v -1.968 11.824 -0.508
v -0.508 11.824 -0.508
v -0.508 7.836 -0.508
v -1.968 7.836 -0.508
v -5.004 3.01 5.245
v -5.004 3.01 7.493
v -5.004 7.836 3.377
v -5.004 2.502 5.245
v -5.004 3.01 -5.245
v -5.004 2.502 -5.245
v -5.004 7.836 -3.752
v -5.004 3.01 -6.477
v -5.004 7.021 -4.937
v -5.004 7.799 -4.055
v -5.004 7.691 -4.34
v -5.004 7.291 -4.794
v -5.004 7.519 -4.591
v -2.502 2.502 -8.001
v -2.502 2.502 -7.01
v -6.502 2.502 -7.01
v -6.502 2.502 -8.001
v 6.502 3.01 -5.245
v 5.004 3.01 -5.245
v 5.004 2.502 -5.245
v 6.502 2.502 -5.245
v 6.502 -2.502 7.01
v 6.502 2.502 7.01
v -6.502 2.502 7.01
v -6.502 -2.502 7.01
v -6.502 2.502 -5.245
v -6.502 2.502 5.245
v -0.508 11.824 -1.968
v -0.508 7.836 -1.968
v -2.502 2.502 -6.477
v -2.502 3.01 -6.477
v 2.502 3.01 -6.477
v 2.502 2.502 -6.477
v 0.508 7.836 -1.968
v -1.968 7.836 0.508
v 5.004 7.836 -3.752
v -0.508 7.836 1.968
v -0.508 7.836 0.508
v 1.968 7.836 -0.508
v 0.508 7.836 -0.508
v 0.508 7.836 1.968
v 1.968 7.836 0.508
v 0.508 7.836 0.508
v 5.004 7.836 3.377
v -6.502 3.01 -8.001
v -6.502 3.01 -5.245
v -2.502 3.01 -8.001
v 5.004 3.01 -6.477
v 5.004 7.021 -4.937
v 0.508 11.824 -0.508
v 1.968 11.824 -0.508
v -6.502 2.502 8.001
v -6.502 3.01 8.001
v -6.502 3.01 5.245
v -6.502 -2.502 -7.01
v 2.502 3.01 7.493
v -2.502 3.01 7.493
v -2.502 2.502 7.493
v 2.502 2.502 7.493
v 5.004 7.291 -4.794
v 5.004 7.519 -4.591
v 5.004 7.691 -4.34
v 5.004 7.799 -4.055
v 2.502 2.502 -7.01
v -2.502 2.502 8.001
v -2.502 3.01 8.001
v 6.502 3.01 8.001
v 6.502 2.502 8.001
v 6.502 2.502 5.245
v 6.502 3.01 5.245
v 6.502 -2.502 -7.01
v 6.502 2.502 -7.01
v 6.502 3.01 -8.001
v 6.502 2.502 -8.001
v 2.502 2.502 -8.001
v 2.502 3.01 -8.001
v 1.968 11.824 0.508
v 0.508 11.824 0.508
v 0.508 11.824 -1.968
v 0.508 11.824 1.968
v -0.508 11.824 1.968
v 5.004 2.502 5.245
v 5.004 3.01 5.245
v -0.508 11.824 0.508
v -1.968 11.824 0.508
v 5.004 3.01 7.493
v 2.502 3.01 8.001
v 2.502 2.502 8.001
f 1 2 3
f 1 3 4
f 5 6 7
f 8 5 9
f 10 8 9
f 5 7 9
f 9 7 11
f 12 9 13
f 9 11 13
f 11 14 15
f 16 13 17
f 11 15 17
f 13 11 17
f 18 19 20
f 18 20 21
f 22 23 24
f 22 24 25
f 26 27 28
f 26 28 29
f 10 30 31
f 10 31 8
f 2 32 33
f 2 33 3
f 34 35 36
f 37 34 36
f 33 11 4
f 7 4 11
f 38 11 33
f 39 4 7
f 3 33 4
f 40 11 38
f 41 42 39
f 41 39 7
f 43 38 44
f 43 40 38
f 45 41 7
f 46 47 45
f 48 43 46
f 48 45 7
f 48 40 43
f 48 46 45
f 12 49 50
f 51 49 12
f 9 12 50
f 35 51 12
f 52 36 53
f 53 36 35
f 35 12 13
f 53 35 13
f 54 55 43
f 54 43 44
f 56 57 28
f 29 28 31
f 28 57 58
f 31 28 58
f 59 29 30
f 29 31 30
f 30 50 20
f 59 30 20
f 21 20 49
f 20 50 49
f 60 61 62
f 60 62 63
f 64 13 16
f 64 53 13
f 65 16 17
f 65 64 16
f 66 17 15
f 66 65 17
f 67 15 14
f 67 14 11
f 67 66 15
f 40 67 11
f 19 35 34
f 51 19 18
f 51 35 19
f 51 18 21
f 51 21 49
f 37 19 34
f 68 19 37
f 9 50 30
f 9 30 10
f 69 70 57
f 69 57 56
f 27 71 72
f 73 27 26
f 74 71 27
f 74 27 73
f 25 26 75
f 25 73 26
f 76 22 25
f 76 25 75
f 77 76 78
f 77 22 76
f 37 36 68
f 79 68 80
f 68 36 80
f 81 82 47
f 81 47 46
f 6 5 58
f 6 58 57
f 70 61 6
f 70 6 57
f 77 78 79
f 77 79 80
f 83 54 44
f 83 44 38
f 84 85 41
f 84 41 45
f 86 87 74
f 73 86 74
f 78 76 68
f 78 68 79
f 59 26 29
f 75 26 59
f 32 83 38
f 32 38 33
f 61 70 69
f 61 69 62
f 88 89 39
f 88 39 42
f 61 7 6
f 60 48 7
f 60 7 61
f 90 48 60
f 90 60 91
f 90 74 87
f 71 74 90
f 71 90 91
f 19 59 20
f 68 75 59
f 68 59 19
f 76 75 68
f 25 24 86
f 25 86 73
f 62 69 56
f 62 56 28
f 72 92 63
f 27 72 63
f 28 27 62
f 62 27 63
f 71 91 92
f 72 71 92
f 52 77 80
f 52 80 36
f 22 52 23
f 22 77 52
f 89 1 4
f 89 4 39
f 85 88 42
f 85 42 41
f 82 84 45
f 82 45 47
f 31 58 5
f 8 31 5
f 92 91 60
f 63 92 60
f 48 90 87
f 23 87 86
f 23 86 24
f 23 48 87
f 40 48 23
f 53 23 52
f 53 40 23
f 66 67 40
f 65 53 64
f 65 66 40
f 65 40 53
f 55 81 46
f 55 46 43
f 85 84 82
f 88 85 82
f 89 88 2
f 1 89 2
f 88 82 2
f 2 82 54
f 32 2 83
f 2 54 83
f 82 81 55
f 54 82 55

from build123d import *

# Parameters (mm, degrees)
SALIENTE_EXTRUIR1_DEPTH      = 6.5024
SALIENTE_EXTRUIR1_DEPTH_BACK = 6.5024
SALIENTE_EXTRUIR2_DEPTH      = 5.0038
SALIENTE_EXTRUIR2_DEPTH_BACK = 5.0038
CROQUIS1_4_W                 = 5.9944
CROQUIS1_4_H                 = 3.9878
SALIENTE_EXTRUIR3_DEPTH      = 3.4671
SALIENTE_EXTRUIR3_DEPTH_BACK = 3.4671
CROQUIS2_W                   = 5.0038
CROQUIS2_H                   = 0.508
CROQUIS2_H_2                 = 1.524
CROQUIS2_W_2                 = 1.4986
CROQUIS2_H_3                 = 10.4902
CORTAR_EXTRUIR1_DEPTH        = 0.508
CROQUIS3_OUTSIDE_W           = 20.026
CROQUIS3_OUTSIDE_H           = 23.024
CORTAR_EXTRUIR2_DEPTH        = 3.9878
CORTAR_EXTRUIR3_DEPTH        = 3.9878


with BuildPart() as part:
    # Croquis1 → Saliente-Extruir1 (new body, two sides)
    with BuildSketch(Plane(origin=(0, 0, 0), x_dir=(0, 0, -1), z_dir=(1, 0, 0))) as saliente_extruir1_sk:
        Polygon((-3.5052, 3.0099), (-7.493, 3.0099), (-8.001, 3.0099), (-8.001, 2.5019), (-7.0104, 2.5019), (-7.0104, -2.5019), (7.0104, -2.5019), (7.0104, 2.5019), (8.001, 2.5019), (8.001, 3.0099), (6.477, 3.0099), align=None)
    extrude(amount=SALIENTE_EXTRUIR1_DEPTH)
    extrude(saliente_extruir1_sk.sketch, amount=-SALIENTE_EXTRUIR1_DEPTH_BACK)

    # Croquis1<3> → Saliente-Extruir2 (add, two sides)
    with BuildSketch(Plane(origin=(0, 0, 0), x_dir=(0, 0, -1), z_dir=(1, 0, 0))) as saliente_extruir2_sk:
        with BuildLine():
            Line((-2.868527833, 7.8359), (-3.376527833, 7.8359))
            Line((-3.376527833, 7.8359), (-7.493, 3.0099))
            Line((-7.493, 3.0099), (-3.5052, 3.0099))
            Line((-3.5052, 3.0099), (6.477, 3.0099))
            Line((6.477, 3.0099), (4.937272491, 7.021027296))
            ThreePointArc((4.937272491, 7.021027296), (4.47096127, 7.61254026), (3.751625349, 7.8359))
            Line((3.751625349, 7.8359), (3.125872167, 7.8359))
            Line((3.125872167, 7.8359), (-2.868527833, 7.8359))
        make_face()
    extrude(amount=SALIENTE_EXTRUIR2_DEPTH)
    extrude(saliente_extruir2_sk.sketch, amount=-SALIENTE_EXTRUIR2_DEPTH_BACK)

    # Croquis1<4> → Saliente-Extruir3 (add, two sides)
    with BuildSketch(Plane(origin=(0, 0, 0), x_dir=(0, 0, -1), z_dir=(1, 0, 0))) as saliente_extruir3_sk:
        with Locations((0.128672167, 9.8298)):
            Rectangle(CROQUIS1_4_W, CROQUIS1_4_H)
    extrude(amount=SALIENTE_EXTRUIR3_DEPTH)
    extrude(saliente_extruir3_sk.sketch, amount=-SALIENTE_EXTRUIR3_DEPTH_BACK)

    # Croquis2 → Cortar-Extruir1 (cut)
    with BuildSketch(Plane(origin=(0, 3.0099, 0), x_dir=(1, 0, 0), z_dir=(0, 1, 0))):
        with Locations((0, -7.747)):
            Rectangle(CROQUIS2_W, CROQUIS2_H)
        with Locations((0, 7.239)):
            Rectangle(CROQUIS2_W, CROQUIS2_H_2)
        with Locations((-5.7531, 0)):
            Rectangle(CROQUIS2_W_2, CROQUIS2_H_3)
        with Locations((5.7531, 0)):
            Rectangle(CROQUIS2_W_2, CROQUIS2_H_3)
    extrude(amount=-CORTAR_EXTRUIR1_DEPTH, mode=Mode.SUBTRACT)

    # Croquis3 outside → Cortar-Extruir2 (cut)
    with BuildSketch(Plane(origin=(0, 11.8237, 0), x_dir=(1, 0, 0), z_dir=(0, 1, 0))):
        Rectangle(CROQUIS3_OUTSIDE_W, CROQUIS3_OUTSIDE_H)
        Polygon((-3.4671, 3.125872167), (-3.4671, -2.868527833), (-1.9685, -2.868527833), (-1.9685, -2.614527833), (-3.2131, -2.614527833), (-3.2131, 2.871872167), (-1.9685, 2.871872167), (-1.9685, 3.125872167), align=None, mode=Mode.SUBTRACT)
        Polygon((0.508, 1.9685), (-0.508, 1.9685), (-0.508, 0.508), (-1.9685, 0.508), (-1.9685, -0.508), (-0.508, -0.508), (-0.508, -1.9685), (0.508, -1.9685), (0.508, -0.508), (1.9685, -0.508), (1.9685, 0.508), (0.508, 0.508), align=None, mode=Mode.SUBTRACT)
        Polygon((3.2131, 2.871872167), (3.2131, -2.614527833), (1.9685, -2.614527833), (1.9685, -2.868527833), (3.4671, -2.868527833), (3.4671, 3.125872167), (1.9685, 3.125872167), (1.9685, 2.871872167), align=None, mode=Mode.SUBTRACT)
    extrude(amount=-CORTAR_EXTRUIR2_DEPTH, mode=Mode.SUBTRACT)

    # Croquis3<2> → Cortar-Extruir3 (cut)
    with BuildSketch(Plane(origin=(0, 11.8237, 0), x_dir=(1, 0, 0), z_dir=(0, 1, 0))):
        Polygon((-3.4671, 3.125872167), (-3.4671, -2.868527833), (-1.9685, -2.868527833), (-1.9685, -2.614527833), (-3.2131, -2.614527833), (-3.2131, 2.871872167), (-1.9685, 2.871872167), (-1.9685, 3.125872167), align=None)
        Polygon((3.2131, 2.871872167), (3.2131, -2.614527833), (1.9685, -2.614527833), (1.9685, -2.868527833), (3.4671, -2.868527833), (3.4671, 3.125872167), (1.9685, 3.125872167), (1.9685, 2.871872167), align=None)
    extrude(amount=-CORTAR_EXTRUIR3_DEPTH, mode=Mode.SUBTRACT)


solid = part.part
